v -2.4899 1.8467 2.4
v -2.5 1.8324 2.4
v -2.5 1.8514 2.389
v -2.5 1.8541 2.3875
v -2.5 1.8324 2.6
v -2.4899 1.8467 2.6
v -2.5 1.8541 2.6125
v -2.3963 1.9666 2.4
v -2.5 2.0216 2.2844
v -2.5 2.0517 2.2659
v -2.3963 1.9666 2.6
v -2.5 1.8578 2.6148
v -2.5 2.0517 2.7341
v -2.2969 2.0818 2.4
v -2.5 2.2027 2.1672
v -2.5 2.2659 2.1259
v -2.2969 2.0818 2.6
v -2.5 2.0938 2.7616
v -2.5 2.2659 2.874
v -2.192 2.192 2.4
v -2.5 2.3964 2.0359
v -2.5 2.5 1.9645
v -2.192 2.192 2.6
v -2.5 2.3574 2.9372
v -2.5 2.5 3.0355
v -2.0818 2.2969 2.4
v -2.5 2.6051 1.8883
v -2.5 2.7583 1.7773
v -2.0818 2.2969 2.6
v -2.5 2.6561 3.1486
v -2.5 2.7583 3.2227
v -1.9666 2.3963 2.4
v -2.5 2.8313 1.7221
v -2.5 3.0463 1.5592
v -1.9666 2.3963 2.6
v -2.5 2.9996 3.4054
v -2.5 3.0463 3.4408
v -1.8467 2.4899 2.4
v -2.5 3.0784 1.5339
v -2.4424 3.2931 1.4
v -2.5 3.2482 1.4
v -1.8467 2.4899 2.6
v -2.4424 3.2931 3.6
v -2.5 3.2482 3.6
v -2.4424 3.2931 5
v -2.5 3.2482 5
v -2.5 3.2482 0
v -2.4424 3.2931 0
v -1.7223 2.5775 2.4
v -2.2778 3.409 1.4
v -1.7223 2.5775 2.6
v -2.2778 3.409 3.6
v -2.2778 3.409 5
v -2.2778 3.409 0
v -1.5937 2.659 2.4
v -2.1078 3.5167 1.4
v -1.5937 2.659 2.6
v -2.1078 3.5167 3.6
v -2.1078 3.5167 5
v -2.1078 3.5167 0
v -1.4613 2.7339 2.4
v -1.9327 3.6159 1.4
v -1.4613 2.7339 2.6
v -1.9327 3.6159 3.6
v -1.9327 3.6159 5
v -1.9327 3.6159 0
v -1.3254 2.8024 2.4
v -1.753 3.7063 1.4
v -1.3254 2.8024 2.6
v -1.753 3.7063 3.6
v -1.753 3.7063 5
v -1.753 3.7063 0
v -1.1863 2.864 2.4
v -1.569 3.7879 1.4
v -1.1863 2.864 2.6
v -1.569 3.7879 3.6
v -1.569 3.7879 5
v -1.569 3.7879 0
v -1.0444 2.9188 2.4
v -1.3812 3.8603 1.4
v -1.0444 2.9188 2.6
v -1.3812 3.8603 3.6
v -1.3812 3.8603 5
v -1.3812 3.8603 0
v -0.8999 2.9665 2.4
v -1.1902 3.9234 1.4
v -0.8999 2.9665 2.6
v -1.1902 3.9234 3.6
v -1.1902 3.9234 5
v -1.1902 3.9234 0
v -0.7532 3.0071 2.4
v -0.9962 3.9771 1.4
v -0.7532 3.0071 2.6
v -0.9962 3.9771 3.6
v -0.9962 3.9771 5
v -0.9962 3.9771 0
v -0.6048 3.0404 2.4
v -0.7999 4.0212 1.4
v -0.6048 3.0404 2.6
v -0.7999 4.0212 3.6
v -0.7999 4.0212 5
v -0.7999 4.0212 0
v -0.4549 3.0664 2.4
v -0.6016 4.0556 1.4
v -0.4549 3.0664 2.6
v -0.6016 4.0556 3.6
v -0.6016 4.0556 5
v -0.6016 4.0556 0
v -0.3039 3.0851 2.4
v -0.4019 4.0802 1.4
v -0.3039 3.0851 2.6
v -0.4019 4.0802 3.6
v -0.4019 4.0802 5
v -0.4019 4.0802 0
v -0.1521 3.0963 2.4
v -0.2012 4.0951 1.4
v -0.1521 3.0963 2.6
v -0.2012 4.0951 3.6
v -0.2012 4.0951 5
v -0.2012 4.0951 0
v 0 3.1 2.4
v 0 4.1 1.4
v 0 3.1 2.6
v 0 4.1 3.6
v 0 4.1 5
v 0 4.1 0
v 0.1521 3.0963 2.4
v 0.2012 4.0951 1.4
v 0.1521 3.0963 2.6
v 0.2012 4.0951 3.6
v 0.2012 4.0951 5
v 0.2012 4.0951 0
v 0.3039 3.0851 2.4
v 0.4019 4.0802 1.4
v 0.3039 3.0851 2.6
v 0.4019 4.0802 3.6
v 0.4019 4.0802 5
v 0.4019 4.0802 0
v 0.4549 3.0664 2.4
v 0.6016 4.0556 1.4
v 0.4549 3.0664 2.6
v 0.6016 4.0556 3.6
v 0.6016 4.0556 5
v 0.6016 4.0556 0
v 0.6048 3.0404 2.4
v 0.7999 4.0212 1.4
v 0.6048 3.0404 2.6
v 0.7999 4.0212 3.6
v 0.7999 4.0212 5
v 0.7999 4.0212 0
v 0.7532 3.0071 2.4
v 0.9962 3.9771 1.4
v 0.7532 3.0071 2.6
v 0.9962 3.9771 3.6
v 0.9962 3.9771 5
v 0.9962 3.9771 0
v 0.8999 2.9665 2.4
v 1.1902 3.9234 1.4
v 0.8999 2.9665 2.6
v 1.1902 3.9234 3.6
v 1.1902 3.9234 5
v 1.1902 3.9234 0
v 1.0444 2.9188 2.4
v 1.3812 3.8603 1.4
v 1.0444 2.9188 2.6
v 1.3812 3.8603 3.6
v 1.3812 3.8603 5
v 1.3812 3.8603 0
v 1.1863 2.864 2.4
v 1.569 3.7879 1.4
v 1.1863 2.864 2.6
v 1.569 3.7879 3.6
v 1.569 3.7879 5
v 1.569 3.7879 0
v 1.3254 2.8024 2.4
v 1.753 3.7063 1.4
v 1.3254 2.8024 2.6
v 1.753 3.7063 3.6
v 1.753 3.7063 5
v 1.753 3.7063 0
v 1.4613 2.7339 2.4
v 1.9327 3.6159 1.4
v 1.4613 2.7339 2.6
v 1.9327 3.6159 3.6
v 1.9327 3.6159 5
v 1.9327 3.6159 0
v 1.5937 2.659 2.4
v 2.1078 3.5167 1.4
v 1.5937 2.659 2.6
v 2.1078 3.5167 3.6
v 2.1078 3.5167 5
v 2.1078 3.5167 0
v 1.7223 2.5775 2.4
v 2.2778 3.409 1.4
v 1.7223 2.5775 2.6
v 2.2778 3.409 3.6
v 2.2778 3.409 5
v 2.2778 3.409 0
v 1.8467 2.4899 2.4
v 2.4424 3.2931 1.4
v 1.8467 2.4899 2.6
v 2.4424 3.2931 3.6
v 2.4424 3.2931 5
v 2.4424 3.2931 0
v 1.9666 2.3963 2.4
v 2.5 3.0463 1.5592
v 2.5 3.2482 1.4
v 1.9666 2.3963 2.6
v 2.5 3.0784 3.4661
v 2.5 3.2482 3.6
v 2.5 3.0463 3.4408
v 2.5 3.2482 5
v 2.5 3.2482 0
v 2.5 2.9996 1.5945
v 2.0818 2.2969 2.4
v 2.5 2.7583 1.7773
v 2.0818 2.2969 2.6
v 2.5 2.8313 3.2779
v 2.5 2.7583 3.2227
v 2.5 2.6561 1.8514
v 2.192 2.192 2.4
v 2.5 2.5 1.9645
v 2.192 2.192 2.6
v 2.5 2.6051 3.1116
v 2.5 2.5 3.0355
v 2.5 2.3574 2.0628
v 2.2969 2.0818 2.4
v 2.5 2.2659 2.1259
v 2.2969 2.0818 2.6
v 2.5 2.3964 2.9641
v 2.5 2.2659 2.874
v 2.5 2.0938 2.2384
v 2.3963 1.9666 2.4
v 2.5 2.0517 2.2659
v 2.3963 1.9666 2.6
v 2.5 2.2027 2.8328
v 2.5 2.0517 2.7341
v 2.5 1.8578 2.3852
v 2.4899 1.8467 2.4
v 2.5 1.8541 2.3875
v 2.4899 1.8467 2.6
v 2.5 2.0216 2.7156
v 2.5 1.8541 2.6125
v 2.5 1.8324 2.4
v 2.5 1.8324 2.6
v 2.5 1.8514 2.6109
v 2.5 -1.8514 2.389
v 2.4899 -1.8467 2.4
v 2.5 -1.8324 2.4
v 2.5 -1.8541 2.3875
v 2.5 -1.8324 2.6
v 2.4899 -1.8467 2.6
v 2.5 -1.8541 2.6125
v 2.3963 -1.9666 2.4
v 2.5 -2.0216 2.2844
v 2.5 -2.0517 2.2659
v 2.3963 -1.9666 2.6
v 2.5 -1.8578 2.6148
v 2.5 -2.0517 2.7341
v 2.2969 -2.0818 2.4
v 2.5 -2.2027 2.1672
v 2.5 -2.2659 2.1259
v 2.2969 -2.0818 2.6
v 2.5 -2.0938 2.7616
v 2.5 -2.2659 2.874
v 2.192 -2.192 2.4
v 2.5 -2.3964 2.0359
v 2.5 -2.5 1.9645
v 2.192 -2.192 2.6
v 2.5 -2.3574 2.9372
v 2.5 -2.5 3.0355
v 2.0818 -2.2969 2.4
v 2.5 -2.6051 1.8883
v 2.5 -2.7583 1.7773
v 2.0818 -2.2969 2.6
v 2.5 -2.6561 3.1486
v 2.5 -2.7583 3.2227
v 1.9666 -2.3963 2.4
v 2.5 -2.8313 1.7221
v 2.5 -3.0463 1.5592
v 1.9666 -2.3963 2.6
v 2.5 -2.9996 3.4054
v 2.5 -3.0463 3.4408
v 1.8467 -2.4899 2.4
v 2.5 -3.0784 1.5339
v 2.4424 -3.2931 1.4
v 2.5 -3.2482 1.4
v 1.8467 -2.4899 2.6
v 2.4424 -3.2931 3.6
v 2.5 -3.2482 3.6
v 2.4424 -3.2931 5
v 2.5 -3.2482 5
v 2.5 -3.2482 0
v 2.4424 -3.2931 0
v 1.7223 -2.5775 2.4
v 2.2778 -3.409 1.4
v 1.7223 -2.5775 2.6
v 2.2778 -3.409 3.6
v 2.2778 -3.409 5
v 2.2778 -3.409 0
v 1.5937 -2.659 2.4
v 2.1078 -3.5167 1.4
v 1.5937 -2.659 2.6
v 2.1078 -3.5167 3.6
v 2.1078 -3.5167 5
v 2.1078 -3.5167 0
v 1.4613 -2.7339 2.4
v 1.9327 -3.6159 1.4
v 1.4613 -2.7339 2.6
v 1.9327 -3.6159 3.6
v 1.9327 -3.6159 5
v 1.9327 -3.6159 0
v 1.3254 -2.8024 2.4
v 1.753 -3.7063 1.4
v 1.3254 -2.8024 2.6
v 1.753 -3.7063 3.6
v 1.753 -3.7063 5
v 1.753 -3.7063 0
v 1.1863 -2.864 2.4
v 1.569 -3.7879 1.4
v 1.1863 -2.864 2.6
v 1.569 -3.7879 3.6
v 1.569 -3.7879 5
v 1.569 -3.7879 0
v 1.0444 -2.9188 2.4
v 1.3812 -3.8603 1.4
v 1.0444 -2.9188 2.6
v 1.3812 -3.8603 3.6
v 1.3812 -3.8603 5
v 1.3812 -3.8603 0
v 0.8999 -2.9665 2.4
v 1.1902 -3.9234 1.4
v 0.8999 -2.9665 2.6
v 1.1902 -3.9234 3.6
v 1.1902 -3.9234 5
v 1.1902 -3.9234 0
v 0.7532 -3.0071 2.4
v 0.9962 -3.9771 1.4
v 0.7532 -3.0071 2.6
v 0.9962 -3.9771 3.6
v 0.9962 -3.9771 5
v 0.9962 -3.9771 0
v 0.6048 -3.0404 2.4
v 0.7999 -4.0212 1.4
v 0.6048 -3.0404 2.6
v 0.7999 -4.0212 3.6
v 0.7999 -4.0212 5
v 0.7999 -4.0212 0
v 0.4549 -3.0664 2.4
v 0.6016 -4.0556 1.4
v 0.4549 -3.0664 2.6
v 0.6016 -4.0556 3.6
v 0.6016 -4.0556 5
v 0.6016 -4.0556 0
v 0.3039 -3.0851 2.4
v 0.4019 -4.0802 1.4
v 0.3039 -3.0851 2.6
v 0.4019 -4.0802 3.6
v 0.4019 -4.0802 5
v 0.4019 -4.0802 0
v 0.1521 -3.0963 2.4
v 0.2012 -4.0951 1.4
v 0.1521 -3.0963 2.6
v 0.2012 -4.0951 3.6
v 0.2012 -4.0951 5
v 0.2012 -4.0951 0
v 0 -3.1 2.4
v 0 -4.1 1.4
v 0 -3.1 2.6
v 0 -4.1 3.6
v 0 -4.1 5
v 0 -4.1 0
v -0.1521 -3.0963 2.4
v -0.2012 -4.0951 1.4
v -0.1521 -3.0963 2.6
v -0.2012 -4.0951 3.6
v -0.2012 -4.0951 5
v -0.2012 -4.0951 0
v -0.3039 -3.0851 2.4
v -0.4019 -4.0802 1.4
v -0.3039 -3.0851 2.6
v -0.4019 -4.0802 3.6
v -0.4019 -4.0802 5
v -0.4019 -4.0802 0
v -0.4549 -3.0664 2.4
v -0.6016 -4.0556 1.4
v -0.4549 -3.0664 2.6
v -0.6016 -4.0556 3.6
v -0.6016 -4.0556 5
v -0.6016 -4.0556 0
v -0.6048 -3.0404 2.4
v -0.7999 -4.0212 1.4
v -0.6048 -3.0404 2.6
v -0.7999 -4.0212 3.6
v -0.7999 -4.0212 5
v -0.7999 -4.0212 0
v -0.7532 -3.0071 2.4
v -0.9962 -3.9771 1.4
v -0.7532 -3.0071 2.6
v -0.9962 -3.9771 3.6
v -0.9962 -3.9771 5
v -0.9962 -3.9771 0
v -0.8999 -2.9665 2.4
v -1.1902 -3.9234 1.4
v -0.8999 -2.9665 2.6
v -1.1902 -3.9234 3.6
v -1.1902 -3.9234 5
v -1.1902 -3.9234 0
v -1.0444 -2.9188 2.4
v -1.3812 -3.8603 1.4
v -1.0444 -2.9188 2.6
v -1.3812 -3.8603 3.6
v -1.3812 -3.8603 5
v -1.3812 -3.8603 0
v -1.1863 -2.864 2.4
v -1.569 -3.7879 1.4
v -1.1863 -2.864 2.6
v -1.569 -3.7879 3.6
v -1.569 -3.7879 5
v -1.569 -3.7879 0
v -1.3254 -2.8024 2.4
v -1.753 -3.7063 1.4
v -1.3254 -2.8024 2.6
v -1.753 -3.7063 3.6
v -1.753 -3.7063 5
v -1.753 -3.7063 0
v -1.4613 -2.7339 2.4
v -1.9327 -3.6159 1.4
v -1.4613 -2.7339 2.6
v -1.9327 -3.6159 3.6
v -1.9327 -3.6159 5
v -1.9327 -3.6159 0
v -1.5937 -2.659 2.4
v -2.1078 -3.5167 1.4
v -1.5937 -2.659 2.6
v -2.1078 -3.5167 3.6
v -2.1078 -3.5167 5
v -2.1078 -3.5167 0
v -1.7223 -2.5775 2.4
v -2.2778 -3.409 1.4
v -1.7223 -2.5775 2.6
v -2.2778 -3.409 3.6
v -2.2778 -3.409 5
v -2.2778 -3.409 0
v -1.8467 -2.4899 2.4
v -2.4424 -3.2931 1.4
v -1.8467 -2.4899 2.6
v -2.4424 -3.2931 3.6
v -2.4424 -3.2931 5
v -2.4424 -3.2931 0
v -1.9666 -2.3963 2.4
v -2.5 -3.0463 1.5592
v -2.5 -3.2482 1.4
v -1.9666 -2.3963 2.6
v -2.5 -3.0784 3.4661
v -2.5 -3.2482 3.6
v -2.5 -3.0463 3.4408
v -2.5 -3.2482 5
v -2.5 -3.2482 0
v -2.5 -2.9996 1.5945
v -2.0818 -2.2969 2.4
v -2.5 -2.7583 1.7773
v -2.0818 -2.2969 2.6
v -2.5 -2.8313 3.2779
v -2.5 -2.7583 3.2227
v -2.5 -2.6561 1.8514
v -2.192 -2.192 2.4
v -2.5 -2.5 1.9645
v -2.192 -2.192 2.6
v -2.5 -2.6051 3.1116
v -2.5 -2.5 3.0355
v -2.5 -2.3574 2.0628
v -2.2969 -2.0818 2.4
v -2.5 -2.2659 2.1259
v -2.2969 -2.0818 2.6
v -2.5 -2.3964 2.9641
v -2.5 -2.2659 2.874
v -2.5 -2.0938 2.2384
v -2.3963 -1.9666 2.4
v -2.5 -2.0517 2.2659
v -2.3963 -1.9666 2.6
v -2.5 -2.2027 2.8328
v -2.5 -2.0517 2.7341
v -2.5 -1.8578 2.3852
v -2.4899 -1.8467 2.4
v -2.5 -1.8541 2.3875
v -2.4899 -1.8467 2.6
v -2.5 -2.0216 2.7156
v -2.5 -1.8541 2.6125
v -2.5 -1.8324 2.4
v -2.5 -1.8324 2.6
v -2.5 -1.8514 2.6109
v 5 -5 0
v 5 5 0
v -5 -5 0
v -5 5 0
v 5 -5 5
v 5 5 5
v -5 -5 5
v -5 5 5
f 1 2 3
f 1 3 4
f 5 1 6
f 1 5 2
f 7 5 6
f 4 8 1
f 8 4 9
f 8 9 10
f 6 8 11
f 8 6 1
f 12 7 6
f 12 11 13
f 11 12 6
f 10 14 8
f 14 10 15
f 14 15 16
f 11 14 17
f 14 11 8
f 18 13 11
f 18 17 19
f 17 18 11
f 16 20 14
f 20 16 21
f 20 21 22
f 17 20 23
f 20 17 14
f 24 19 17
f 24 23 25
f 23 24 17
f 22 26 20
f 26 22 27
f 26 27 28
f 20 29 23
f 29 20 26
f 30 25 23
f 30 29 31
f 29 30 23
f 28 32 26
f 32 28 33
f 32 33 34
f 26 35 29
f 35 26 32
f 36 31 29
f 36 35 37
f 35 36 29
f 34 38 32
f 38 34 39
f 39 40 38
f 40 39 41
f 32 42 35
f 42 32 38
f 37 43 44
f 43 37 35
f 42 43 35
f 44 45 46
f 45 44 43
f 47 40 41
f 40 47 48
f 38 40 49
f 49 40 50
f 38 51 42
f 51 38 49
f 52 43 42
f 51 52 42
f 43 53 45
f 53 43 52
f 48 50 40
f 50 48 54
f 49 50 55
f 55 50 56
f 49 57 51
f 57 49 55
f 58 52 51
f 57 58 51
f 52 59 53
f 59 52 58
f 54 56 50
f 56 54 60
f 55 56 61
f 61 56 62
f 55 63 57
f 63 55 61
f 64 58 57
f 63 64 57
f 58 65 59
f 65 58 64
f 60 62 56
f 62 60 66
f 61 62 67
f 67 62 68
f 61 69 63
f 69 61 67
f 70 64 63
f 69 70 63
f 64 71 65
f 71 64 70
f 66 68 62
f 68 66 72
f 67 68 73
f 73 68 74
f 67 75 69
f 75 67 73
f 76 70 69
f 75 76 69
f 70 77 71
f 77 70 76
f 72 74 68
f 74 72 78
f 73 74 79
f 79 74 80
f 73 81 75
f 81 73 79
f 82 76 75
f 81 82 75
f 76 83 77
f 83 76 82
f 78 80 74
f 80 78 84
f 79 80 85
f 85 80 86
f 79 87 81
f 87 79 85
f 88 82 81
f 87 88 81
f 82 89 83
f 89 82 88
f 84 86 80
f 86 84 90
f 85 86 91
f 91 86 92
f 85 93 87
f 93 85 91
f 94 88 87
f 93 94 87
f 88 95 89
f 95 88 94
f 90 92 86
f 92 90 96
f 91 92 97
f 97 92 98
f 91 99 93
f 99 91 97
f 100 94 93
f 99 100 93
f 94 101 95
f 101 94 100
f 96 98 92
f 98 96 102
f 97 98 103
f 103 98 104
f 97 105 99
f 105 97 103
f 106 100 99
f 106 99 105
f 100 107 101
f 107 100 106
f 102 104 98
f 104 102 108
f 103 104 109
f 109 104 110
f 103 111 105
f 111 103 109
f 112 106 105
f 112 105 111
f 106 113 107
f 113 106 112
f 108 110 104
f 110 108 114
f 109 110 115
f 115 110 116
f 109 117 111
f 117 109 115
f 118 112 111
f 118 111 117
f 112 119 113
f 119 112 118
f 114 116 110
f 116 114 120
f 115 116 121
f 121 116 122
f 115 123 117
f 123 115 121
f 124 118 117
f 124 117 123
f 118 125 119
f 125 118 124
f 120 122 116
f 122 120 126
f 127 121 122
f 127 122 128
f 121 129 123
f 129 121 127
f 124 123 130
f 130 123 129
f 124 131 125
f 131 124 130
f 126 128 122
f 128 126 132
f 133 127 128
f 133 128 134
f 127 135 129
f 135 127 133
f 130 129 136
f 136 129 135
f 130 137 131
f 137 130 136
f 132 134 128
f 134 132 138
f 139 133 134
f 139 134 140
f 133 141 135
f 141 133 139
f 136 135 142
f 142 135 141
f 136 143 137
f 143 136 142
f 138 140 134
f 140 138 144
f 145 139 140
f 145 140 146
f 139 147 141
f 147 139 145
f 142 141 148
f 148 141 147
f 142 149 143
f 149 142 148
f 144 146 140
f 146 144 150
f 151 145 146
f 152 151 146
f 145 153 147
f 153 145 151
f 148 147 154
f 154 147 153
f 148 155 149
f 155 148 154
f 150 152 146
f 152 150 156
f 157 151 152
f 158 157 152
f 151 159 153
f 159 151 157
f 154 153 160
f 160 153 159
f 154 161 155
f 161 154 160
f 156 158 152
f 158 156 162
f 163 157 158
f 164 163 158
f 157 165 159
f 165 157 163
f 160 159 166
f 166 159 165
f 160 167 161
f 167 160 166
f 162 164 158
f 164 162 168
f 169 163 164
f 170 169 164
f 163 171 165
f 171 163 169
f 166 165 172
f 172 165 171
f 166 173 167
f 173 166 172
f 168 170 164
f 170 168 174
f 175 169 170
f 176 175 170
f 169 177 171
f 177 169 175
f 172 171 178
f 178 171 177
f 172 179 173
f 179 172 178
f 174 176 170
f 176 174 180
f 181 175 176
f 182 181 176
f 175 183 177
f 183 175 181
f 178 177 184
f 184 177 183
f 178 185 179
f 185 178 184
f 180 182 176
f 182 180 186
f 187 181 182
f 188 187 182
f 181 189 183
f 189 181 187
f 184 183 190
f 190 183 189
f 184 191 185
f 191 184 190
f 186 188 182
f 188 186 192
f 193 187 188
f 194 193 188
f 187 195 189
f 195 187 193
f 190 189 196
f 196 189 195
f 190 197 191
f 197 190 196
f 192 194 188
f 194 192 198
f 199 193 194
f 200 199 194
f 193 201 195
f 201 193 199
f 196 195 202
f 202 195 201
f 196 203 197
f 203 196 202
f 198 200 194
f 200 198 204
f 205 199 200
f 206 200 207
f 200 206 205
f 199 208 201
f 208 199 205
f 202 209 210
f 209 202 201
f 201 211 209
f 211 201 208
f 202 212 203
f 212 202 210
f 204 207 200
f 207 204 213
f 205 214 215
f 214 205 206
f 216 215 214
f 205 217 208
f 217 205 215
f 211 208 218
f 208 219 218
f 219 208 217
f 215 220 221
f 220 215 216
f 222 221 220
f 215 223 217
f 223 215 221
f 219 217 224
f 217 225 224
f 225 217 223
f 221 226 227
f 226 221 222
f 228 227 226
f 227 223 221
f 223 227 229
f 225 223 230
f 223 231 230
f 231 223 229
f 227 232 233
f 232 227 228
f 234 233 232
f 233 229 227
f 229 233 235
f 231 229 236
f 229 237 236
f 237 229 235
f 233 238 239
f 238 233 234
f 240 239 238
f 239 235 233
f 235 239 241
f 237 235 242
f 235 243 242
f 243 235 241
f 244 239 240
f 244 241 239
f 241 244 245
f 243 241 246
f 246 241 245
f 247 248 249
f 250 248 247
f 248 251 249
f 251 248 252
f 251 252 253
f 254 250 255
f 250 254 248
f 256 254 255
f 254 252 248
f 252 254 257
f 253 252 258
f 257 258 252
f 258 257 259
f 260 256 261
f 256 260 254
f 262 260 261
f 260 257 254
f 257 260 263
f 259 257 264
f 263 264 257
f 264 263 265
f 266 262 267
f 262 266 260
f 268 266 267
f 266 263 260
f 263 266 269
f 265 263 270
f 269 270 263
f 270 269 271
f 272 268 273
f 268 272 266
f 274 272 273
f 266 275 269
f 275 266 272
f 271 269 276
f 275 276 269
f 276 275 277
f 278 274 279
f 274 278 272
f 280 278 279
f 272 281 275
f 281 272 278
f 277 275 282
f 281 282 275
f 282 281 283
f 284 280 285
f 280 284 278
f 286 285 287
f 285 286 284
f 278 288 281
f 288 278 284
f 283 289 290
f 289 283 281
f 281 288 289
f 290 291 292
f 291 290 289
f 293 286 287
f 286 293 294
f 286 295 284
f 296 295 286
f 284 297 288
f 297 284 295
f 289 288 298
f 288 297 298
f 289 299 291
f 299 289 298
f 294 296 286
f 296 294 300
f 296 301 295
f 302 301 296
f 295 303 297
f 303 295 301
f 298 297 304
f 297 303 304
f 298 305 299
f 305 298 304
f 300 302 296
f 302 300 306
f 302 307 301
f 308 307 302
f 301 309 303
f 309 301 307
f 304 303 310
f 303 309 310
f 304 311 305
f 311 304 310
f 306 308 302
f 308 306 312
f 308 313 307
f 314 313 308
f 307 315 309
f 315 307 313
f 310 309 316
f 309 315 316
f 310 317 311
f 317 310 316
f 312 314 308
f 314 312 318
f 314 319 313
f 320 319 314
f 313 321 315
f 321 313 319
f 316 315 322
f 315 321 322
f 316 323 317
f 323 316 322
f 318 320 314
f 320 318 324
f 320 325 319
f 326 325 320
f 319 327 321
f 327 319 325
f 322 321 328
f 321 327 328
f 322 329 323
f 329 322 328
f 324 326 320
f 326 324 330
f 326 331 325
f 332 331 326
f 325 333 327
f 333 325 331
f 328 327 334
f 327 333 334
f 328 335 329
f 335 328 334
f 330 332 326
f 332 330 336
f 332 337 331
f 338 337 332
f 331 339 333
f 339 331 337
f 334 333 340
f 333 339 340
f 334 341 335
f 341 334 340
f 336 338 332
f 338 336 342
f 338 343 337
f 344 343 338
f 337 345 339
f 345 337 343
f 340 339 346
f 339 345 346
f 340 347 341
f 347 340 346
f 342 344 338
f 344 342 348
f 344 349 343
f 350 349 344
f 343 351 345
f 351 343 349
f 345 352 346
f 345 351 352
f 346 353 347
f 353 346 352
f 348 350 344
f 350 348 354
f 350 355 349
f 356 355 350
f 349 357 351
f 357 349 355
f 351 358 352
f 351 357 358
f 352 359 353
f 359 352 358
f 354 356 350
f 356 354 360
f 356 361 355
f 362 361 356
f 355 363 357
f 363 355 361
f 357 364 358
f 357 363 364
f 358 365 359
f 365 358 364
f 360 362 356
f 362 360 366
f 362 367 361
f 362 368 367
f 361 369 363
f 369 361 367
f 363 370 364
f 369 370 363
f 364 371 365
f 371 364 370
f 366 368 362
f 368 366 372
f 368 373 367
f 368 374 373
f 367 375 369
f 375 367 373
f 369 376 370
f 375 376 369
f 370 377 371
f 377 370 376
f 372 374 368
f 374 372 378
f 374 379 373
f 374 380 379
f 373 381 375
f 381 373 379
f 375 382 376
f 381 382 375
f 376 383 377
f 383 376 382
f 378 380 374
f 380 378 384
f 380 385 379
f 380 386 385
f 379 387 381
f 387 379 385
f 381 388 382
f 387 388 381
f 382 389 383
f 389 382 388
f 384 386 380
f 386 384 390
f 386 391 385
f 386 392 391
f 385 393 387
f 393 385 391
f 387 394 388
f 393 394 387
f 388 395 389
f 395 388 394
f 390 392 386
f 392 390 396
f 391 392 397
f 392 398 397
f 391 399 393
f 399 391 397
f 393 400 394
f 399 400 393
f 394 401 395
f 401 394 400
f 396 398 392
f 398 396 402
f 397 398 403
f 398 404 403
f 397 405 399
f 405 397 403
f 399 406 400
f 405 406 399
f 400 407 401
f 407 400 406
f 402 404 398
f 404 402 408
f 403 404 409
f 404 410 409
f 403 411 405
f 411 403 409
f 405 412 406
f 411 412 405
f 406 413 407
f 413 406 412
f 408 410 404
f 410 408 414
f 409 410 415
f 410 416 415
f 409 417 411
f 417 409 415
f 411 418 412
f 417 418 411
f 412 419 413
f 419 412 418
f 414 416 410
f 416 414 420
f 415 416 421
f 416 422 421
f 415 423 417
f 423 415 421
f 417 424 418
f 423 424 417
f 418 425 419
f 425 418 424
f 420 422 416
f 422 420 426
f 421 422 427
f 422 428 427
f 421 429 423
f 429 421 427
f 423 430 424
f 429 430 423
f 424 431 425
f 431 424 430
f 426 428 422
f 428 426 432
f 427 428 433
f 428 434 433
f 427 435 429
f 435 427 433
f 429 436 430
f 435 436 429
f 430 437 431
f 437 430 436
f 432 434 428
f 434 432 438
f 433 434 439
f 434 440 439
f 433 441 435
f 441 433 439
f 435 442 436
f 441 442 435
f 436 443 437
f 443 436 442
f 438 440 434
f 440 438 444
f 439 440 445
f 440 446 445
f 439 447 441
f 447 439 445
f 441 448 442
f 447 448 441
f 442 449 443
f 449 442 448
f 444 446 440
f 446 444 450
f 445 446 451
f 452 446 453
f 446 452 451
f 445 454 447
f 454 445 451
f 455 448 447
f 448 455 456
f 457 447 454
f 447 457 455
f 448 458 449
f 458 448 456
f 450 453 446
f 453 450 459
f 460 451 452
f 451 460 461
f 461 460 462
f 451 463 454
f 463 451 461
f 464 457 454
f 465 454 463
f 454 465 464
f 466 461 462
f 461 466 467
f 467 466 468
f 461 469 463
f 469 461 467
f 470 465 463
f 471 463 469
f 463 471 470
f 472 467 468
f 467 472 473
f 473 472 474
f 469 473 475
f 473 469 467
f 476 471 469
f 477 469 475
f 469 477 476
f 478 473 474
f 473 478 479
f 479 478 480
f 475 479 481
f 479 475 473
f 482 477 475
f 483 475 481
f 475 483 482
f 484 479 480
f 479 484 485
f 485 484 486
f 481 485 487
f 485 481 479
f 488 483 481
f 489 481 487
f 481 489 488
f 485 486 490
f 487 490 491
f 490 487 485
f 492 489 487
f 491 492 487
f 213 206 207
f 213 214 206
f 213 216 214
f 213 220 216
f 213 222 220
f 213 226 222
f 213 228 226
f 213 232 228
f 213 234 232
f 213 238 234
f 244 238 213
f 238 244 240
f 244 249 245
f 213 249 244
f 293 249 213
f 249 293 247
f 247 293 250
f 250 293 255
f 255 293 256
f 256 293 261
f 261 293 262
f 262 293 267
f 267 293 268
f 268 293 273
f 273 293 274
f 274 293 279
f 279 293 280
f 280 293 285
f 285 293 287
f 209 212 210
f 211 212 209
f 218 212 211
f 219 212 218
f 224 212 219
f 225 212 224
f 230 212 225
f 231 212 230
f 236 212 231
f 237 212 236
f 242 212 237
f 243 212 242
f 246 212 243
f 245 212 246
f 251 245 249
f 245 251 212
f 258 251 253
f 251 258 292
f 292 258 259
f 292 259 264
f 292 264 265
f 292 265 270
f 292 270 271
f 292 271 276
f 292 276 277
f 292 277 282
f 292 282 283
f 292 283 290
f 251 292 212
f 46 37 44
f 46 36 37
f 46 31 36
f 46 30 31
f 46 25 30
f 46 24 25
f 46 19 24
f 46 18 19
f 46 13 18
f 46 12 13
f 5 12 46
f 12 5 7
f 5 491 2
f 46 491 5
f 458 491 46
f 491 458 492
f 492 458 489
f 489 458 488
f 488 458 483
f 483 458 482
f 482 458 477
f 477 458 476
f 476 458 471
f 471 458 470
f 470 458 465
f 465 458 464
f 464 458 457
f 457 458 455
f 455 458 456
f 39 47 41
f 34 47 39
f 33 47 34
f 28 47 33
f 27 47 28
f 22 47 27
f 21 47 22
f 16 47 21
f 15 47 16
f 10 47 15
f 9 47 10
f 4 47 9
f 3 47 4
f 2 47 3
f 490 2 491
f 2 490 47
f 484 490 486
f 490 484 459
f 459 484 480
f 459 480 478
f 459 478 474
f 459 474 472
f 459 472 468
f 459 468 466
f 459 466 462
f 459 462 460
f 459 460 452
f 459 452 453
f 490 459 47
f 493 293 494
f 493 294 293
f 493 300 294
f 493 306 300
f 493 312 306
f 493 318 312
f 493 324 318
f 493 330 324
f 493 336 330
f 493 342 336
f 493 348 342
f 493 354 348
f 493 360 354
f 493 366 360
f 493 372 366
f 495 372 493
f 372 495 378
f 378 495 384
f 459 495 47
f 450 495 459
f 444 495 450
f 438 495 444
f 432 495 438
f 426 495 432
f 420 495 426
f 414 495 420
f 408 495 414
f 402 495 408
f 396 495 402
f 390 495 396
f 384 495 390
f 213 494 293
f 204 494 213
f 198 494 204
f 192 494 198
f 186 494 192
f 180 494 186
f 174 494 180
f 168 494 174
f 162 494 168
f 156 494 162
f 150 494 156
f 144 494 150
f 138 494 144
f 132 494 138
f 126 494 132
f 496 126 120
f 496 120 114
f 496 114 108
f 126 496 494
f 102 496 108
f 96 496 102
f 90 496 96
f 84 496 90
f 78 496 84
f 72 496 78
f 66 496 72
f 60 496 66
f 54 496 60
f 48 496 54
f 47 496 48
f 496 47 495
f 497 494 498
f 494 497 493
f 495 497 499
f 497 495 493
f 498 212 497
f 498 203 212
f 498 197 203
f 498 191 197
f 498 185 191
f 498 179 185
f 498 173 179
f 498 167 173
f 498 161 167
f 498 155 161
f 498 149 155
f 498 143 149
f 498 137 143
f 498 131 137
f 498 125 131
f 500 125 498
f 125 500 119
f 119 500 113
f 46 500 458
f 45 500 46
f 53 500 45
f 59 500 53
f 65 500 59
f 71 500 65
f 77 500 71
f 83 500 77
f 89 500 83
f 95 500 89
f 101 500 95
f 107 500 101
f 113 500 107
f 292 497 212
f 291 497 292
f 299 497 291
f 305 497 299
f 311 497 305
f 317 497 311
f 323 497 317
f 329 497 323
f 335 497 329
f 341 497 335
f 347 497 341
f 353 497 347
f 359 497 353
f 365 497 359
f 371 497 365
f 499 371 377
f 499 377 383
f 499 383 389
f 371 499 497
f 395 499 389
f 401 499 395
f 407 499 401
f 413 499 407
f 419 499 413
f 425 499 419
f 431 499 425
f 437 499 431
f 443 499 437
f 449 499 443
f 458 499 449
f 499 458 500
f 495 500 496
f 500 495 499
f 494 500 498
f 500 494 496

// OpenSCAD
difference()
{
    linear_extrude(height = 5.0, twist = 0.0, scale = 1.0, slices = 1, center = false)
    {
        scale([10.0, 10.0])
        {
            M22();
        }
    }
    intersection()
    {
        rotate_extrude(angle = 360.0, $fn = 128)
        {
            M19();
        }
        translate([0.0, 0.0, -0.2])
        {
            linear_extrude(height = 10.4, twist = 0.0, scale = 1.0, slices = 1, center = false)
            {
                scale([5.0, 10.0])
                {
                    M22();
                }
            }
        }
    }
}

module M19()
{
    polygon
    (
        points =
        [
            [0.0, -0.2], 
            [4.1, -0.2], 
            [4.1, 1.4], 
            [3.1, 2.4], 
            [3.1, 2.6], 
            [4.1, 3.6], 
            [4.1, 5.2], 
            [0.0, 5.2]
        ],
        paths =
        [
            [0, 1, 2, 3, 4, 5, 6, 7]
        ]
    );
}

module M22()
{
    polygon
    (
        points =
        [
            [-0.5, -0.5], 
            [0.5, -0.5], 
            [0.5, 0.5], 
            [-0.5, 0.5]
        ],
        paths =
        [
            [0, 1, 2, 3]
        ]
    );
}
